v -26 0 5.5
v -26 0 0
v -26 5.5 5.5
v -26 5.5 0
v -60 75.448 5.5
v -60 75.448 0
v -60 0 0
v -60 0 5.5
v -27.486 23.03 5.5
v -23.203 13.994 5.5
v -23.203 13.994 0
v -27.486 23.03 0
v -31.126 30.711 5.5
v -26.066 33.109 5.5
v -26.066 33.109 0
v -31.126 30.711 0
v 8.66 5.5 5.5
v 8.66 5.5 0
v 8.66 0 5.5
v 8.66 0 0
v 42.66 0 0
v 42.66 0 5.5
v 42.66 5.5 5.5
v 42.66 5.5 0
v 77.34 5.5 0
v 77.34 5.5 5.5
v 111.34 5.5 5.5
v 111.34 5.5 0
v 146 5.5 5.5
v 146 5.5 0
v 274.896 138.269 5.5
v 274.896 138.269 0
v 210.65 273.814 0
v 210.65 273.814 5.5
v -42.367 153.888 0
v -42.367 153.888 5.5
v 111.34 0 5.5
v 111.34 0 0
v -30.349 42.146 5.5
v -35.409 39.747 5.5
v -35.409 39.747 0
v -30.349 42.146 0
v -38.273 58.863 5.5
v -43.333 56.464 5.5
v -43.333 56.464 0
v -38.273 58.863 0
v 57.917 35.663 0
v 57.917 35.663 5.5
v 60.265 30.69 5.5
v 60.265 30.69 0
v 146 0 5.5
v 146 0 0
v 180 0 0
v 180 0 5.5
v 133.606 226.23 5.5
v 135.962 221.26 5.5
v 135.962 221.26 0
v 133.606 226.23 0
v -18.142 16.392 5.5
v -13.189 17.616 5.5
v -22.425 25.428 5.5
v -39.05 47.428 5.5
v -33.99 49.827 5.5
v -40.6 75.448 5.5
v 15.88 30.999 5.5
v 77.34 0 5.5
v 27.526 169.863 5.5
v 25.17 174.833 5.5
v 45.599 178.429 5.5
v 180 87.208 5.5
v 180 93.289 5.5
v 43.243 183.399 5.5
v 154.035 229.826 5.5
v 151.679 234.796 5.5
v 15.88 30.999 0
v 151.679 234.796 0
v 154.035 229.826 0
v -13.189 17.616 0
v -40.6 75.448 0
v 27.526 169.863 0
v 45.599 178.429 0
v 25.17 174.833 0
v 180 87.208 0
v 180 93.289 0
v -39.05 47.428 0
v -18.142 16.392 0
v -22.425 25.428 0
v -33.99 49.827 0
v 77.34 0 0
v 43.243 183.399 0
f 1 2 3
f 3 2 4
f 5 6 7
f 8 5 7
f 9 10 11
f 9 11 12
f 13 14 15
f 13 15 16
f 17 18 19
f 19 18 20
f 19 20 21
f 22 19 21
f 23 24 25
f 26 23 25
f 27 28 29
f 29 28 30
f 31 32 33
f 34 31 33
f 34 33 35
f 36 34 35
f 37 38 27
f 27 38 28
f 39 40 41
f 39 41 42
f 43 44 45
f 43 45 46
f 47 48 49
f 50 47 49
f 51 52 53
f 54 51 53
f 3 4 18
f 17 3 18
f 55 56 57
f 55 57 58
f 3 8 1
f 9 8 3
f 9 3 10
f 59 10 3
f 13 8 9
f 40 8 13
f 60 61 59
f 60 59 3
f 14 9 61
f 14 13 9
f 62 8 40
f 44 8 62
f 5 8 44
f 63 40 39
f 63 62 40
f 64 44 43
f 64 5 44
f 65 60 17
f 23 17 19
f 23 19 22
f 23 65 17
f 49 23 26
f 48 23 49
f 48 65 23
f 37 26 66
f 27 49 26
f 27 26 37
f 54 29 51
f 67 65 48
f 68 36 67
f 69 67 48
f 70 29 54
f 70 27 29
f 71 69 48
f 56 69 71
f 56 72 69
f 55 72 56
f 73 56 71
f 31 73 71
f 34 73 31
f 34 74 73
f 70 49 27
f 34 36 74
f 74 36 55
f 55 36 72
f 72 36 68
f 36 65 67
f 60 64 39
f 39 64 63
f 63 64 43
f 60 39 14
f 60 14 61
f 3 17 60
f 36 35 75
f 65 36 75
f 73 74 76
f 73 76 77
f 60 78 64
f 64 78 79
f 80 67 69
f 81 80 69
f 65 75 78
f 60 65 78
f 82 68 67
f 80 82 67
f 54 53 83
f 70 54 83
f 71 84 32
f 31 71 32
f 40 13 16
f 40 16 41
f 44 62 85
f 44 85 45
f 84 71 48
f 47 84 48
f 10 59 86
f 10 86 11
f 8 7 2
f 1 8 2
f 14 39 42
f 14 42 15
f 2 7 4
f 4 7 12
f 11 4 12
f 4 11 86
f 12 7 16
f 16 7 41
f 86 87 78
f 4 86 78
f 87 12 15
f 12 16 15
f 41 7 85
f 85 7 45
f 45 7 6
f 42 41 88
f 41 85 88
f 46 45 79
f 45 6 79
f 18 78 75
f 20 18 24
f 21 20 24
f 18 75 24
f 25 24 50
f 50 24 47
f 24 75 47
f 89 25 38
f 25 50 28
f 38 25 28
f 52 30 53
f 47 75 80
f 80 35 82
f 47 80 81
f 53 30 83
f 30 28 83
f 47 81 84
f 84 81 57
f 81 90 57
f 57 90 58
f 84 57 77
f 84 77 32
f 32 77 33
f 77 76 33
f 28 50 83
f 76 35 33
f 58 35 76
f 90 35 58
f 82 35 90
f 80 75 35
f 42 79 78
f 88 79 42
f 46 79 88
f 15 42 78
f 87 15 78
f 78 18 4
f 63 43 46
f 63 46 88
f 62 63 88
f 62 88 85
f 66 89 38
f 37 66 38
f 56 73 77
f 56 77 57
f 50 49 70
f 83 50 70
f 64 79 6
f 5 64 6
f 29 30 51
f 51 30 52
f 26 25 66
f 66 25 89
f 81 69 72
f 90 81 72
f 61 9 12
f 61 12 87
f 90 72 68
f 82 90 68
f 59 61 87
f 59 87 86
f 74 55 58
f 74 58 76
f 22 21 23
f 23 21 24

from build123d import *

# Parameters (mm, degrees)
SALIENTE_EXTRUIR1_DEPTH = 5.5
CORTAR_EXTRUIR1_DEPTH   = 5.5
CORTAR_EXTRUIR4_DEPTH   = 5.5
CORTAR_EXTRUIR5_DEPTH   = 5.5


with BuildPart() as part:
    # Croquis1 → Saliente-Extruir1 (new body)
    with BuildSketch(Plane.XY):
        Polygon((180, 0), (180, 93.289473684), (274.896352923, 138.268626086), (210.65044876, 273.81368796), (-42.36700007, 153.888000188), (15.880022719, 30.999289839), (-13.188895459, 17.615531012), (-40.600481236, 75.448090745), (-60, 75.448090745), (-60, 0), (-26, 0), (-26, 5.5), (8.66, 5.5), (8.66, 0), (42.66, 0), (42.66, 5.5), (77.34, 5.5), (77.34, 0), (111.34, 0), (111.34, 5.5), (146, 5.5), (146, 0), align=None)
    extrude(amount=SALIENTE_EXTRUIR1_DEPTH)

    # Croquis2 → Cortar-Extruir1 (cut)
    with BuildSketch(Plane.XY.offset(5.5)):
        Polygon((180, 93.289473684), (57.917117024, 35.663353874), (60.264847831, 30.68960679), (180, 87.207539986), align=None)
    extrude(amount=-CORTAR_EXTRUIR1_DEPTH, mode=Mode.SUBTRACT)

    # Croquis4 → Cortar-Extruir4 (cut)
    with BuildSketch(Plane.XY.offset(5.5)):
        Polygon((-43.332939479, 56.464331481), (-38.272590503, 58.862845236), (-33.989530225, 49.826507778), (-39.049879202, 47.427994023), align=None)
        Polygon((-35.409277966, 39.747107183), (-30.348928989, 42.145620939), (-26.065868712, 33.10928348), (-31.126217688, 30.710769725), align=None)
        Polygon((-27.485616452, 23.029882886), (-22.425267476, 25.428396641), (-18.142207198, 16.392059183), (-23.202556175, 13.993545427), align=None)
    extrude(amount=-CORTAR_EXTRUIR4_DEPTH, mode=Mode.SUBTRACT)

    # Croquis5 → Cortar-Extruir5 (cut)
    with BuildSketch(Plane.XY.offset(5.5)):
        Polygon((25.170422415, 174.833084673), (27.526105568, 169.863099071), (45.598780484, 178.429219626), (43.243097332, 183.399205228), align=None)
        Polygon((133.606471914, 226.229808004), (151.67914683, 234.795928559), (154.034829983, 229.825942957), (135.962155066, 221.259822402), align=None)
    extrude(amount=-CORTAR_EXTRUIR5_DEPTH, mode=Mode.SUBTRACT)


solid = part.part
